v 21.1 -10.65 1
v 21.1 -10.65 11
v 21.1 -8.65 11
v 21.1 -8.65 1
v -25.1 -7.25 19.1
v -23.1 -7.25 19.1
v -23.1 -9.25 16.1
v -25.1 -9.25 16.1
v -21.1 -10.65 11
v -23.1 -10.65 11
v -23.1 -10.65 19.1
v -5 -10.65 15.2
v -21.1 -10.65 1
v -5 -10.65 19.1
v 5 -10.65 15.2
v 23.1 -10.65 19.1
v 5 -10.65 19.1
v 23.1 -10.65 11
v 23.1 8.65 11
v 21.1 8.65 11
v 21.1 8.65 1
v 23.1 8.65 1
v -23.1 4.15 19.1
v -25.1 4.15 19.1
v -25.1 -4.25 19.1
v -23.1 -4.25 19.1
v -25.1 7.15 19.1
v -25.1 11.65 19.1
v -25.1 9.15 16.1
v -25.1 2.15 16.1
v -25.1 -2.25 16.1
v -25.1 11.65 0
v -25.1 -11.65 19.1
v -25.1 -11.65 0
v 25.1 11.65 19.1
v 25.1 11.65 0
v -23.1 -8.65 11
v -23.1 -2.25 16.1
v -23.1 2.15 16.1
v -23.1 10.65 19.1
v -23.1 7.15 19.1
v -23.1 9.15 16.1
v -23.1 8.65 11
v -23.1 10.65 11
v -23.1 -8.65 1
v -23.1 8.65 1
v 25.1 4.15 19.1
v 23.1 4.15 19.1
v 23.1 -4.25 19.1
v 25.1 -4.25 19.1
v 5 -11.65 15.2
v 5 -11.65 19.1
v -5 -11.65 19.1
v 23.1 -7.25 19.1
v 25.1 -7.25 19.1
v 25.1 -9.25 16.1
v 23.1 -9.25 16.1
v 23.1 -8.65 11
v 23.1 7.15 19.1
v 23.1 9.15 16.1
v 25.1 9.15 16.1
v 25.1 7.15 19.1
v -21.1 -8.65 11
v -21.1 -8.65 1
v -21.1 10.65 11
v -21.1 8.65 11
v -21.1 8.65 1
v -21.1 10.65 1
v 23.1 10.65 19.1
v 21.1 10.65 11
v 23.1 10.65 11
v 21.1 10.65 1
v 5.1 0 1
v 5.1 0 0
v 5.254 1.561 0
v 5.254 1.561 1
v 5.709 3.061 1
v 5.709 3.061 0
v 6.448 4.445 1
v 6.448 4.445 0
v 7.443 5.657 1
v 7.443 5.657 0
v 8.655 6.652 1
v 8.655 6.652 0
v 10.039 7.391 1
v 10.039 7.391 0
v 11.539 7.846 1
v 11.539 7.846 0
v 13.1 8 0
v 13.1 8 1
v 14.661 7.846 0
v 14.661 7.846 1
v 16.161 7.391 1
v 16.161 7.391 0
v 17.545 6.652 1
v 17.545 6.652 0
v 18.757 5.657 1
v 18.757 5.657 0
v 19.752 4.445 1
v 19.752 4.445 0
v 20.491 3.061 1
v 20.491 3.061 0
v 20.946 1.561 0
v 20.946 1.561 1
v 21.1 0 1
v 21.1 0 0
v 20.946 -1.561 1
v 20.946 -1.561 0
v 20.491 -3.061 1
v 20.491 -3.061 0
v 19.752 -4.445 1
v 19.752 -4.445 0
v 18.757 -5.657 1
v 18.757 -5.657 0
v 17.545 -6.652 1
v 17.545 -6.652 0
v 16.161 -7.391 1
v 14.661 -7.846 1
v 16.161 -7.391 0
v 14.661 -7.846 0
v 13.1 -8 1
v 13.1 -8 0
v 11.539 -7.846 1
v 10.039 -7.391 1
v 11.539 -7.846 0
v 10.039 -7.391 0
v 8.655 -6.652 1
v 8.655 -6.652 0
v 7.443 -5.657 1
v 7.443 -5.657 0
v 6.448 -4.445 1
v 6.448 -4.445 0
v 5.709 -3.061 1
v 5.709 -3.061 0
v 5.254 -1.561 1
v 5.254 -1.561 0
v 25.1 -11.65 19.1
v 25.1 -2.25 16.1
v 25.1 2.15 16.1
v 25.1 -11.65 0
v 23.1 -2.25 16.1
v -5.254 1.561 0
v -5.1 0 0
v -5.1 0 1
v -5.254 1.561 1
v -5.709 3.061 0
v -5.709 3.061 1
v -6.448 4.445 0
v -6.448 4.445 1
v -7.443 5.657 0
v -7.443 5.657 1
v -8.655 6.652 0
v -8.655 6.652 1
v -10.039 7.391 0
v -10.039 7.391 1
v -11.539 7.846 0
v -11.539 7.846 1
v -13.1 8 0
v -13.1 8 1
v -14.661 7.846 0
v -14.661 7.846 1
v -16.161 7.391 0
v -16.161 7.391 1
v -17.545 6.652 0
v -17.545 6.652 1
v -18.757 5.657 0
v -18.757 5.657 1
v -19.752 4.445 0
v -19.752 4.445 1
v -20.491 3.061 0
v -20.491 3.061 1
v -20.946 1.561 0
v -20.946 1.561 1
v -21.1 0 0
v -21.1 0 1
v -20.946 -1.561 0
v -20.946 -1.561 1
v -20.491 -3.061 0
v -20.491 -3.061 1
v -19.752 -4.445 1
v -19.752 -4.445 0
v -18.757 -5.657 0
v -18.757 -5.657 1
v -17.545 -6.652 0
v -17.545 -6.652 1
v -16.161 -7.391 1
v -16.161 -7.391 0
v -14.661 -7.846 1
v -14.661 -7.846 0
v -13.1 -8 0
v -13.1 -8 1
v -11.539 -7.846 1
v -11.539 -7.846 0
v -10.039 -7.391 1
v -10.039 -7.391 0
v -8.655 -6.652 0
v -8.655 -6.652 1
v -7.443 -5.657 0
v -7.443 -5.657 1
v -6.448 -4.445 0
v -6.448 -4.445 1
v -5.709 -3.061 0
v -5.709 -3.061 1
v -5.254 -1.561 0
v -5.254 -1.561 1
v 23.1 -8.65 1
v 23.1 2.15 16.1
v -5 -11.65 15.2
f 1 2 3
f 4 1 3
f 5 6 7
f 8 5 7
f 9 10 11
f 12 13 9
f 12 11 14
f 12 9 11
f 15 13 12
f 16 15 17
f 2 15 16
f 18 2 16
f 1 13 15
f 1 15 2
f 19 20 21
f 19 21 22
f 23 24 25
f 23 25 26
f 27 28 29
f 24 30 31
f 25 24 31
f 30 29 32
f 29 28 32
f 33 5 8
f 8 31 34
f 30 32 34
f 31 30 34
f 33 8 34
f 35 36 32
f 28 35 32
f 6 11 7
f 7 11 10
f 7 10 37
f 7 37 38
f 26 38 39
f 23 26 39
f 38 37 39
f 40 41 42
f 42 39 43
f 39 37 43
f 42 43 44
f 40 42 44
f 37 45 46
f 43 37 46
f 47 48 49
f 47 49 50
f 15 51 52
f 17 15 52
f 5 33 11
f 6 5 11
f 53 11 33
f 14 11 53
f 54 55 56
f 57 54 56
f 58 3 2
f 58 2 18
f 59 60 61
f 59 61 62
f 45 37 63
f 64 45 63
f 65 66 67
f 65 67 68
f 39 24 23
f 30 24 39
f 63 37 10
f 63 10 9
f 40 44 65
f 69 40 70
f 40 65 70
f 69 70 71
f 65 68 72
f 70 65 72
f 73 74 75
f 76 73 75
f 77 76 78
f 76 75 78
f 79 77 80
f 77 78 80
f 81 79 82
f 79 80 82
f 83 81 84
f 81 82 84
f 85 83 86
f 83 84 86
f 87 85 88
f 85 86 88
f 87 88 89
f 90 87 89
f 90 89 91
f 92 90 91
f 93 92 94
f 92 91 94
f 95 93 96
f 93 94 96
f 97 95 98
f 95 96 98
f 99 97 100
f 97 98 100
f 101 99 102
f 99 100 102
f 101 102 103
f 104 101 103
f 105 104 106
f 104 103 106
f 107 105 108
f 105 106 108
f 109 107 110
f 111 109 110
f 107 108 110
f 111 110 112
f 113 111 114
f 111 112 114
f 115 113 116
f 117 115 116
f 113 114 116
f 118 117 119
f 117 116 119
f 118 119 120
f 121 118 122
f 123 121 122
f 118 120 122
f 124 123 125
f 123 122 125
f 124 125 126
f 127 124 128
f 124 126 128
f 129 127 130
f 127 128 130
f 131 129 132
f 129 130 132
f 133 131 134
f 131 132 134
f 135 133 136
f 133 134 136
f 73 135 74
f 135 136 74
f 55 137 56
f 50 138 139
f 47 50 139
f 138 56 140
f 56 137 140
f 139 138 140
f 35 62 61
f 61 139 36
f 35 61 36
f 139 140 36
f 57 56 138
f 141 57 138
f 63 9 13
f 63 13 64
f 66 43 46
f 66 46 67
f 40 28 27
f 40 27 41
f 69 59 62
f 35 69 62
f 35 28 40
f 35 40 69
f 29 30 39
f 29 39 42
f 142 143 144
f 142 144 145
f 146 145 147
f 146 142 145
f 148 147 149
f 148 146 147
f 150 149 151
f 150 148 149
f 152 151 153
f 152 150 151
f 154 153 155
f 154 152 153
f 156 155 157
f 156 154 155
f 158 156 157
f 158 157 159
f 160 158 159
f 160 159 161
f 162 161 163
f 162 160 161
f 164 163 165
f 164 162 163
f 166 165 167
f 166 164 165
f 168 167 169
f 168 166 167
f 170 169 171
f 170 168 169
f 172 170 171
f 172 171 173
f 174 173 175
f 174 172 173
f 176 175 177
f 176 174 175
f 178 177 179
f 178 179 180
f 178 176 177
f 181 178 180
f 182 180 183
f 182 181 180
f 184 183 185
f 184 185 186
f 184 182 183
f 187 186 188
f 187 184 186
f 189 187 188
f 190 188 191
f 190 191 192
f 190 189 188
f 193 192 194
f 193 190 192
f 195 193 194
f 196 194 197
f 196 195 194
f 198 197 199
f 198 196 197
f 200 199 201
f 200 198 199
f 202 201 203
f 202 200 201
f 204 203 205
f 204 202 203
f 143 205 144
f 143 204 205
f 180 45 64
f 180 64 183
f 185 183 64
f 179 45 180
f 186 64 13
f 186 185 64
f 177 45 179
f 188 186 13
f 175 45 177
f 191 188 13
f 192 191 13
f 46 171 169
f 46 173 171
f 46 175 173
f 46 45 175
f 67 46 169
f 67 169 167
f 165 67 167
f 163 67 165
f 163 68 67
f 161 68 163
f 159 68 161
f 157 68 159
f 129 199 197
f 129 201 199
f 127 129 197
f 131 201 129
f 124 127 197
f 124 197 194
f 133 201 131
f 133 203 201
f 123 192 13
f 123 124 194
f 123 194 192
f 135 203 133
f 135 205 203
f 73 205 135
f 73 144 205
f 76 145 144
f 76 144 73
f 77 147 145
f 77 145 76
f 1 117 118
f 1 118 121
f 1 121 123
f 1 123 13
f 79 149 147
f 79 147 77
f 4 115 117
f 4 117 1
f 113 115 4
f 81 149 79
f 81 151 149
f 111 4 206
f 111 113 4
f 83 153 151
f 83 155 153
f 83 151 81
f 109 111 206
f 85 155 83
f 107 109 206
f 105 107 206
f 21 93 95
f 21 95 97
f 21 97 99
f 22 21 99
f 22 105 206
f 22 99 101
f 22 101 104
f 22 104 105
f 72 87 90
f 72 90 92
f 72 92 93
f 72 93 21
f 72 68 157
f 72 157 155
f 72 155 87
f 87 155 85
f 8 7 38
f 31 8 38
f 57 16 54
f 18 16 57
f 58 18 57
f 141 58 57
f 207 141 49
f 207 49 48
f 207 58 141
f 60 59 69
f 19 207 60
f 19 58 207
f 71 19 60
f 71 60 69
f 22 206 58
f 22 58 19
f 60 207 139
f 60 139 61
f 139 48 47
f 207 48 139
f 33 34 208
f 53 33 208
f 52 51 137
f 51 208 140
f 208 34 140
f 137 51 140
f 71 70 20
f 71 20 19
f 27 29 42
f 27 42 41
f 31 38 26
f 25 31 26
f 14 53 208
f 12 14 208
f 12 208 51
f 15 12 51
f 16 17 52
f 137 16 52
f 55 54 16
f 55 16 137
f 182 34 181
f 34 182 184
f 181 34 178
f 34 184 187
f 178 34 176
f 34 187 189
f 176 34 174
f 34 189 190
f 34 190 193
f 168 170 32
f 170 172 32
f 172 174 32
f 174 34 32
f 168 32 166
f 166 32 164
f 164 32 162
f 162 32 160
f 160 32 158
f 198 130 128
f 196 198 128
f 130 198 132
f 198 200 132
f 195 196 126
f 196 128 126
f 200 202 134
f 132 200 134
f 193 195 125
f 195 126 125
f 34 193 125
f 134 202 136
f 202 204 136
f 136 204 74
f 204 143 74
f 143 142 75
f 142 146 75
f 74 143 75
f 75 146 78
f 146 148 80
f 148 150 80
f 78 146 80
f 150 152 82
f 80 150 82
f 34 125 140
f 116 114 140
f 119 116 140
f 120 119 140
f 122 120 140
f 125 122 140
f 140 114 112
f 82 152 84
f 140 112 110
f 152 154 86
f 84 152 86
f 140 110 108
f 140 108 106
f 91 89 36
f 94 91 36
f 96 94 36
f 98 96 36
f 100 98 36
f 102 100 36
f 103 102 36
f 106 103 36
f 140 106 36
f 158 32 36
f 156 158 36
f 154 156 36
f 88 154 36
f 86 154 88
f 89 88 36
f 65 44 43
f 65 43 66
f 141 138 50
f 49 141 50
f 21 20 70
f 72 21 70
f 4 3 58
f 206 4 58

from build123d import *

# Parameters (mm, degrees)
F0_W     = 46.2
F0_H     = 21.3
F1_DEPTH = 19.1
F0_R     = 8
F2_DEPTH = 1
F3_W     = 10
F3_H     = 0.0997345659
F3_H_2   = 3.9002654341
F4_DEPTH = 4
F6_DEPTH = 28
F7_W     = 2
F7_H     = 2
F8_DEPTH = 10


with BuildPart() as f1:
    # F0 (on Top) → F1 (new body)
    with BuildSketch(Plane.XY):
        Polygon((24.1, 11.65), (-24.1, 11.65), (-25.1, 11.65), (-25.1, -11.65), (-24.1, -11.65), (24.4, -11.65), (25.1, -11.65), (25.1, 11.65), align=None)
        Rectangle(F0_W, F0_H, mode=Mode.SUBTRACT)
    extrude(amount=F1_DEPTH)

    # F0 (on Top) → F2 (join)
    with BuildSketch(Plane.XY):
        Rectangle(F0_W, F0_H)
        with Locations((-13.1, 0)):
            Circle(F0_R, mode=Mode.SUBTRACT)
        with BuildLine():
            ThreePointArc((21.1, 0), (13.1, -8), (5.1, 0))
            ThreePointArc((5.1, 0), (13.1, 8), (21.1, 0))
        make_face(mode=Mode.SUBTRACT)
    extrude(amount=F2_DEPTH)

    # F3 (on face) → F4 (cut)
    with BuildSketch(Plane.XZ.offset(11.65)):
        with Locations((0, 19.1498672829)):
            Rectangle(F3_W, F3_H)
        with Locations((0, 17.1498672829)):
            Rectangle(F3_W, F3_H_2)
    extrude(amount=-F4_DEPTH, mode=Mode.SUBTRACT)

    # F5 (on Right) → F6 (cut, symmetric)
    with BuildSketch(Plane.YZ):
        Polygon((9.15, 16.1), (7.15, 19.1), (4.15, 19.1), (2.15, 16.1), align=None)
        Polygon((-2.25, 16.1), (-4.25, 19.1), (-7.25, 19.1), (-9.25, 16.1), align=None)
    extrude(amount=F6_DEPTH, both=True, mode=Mode.SUBTRACT)

    # F7 (on face) → F8 (join)
    with BuildSketch(Plane.XY.offset(1)):
        with Locations((-22.1, 9.65)):
            Rectangle(F7_W, F7_H)
        with Locations((-22.1, -9.65)):
            Rectangle(F7_W, F7_H)
        with Locations((22.1, -9.65)):
            Rectangle(F7_W, F7_H)
        with Locations((22.1, 9.65)):
            Rectangle(F7_W, F7_H)
    extrude(amount=F8_DEPTH)


solid = f1.part
